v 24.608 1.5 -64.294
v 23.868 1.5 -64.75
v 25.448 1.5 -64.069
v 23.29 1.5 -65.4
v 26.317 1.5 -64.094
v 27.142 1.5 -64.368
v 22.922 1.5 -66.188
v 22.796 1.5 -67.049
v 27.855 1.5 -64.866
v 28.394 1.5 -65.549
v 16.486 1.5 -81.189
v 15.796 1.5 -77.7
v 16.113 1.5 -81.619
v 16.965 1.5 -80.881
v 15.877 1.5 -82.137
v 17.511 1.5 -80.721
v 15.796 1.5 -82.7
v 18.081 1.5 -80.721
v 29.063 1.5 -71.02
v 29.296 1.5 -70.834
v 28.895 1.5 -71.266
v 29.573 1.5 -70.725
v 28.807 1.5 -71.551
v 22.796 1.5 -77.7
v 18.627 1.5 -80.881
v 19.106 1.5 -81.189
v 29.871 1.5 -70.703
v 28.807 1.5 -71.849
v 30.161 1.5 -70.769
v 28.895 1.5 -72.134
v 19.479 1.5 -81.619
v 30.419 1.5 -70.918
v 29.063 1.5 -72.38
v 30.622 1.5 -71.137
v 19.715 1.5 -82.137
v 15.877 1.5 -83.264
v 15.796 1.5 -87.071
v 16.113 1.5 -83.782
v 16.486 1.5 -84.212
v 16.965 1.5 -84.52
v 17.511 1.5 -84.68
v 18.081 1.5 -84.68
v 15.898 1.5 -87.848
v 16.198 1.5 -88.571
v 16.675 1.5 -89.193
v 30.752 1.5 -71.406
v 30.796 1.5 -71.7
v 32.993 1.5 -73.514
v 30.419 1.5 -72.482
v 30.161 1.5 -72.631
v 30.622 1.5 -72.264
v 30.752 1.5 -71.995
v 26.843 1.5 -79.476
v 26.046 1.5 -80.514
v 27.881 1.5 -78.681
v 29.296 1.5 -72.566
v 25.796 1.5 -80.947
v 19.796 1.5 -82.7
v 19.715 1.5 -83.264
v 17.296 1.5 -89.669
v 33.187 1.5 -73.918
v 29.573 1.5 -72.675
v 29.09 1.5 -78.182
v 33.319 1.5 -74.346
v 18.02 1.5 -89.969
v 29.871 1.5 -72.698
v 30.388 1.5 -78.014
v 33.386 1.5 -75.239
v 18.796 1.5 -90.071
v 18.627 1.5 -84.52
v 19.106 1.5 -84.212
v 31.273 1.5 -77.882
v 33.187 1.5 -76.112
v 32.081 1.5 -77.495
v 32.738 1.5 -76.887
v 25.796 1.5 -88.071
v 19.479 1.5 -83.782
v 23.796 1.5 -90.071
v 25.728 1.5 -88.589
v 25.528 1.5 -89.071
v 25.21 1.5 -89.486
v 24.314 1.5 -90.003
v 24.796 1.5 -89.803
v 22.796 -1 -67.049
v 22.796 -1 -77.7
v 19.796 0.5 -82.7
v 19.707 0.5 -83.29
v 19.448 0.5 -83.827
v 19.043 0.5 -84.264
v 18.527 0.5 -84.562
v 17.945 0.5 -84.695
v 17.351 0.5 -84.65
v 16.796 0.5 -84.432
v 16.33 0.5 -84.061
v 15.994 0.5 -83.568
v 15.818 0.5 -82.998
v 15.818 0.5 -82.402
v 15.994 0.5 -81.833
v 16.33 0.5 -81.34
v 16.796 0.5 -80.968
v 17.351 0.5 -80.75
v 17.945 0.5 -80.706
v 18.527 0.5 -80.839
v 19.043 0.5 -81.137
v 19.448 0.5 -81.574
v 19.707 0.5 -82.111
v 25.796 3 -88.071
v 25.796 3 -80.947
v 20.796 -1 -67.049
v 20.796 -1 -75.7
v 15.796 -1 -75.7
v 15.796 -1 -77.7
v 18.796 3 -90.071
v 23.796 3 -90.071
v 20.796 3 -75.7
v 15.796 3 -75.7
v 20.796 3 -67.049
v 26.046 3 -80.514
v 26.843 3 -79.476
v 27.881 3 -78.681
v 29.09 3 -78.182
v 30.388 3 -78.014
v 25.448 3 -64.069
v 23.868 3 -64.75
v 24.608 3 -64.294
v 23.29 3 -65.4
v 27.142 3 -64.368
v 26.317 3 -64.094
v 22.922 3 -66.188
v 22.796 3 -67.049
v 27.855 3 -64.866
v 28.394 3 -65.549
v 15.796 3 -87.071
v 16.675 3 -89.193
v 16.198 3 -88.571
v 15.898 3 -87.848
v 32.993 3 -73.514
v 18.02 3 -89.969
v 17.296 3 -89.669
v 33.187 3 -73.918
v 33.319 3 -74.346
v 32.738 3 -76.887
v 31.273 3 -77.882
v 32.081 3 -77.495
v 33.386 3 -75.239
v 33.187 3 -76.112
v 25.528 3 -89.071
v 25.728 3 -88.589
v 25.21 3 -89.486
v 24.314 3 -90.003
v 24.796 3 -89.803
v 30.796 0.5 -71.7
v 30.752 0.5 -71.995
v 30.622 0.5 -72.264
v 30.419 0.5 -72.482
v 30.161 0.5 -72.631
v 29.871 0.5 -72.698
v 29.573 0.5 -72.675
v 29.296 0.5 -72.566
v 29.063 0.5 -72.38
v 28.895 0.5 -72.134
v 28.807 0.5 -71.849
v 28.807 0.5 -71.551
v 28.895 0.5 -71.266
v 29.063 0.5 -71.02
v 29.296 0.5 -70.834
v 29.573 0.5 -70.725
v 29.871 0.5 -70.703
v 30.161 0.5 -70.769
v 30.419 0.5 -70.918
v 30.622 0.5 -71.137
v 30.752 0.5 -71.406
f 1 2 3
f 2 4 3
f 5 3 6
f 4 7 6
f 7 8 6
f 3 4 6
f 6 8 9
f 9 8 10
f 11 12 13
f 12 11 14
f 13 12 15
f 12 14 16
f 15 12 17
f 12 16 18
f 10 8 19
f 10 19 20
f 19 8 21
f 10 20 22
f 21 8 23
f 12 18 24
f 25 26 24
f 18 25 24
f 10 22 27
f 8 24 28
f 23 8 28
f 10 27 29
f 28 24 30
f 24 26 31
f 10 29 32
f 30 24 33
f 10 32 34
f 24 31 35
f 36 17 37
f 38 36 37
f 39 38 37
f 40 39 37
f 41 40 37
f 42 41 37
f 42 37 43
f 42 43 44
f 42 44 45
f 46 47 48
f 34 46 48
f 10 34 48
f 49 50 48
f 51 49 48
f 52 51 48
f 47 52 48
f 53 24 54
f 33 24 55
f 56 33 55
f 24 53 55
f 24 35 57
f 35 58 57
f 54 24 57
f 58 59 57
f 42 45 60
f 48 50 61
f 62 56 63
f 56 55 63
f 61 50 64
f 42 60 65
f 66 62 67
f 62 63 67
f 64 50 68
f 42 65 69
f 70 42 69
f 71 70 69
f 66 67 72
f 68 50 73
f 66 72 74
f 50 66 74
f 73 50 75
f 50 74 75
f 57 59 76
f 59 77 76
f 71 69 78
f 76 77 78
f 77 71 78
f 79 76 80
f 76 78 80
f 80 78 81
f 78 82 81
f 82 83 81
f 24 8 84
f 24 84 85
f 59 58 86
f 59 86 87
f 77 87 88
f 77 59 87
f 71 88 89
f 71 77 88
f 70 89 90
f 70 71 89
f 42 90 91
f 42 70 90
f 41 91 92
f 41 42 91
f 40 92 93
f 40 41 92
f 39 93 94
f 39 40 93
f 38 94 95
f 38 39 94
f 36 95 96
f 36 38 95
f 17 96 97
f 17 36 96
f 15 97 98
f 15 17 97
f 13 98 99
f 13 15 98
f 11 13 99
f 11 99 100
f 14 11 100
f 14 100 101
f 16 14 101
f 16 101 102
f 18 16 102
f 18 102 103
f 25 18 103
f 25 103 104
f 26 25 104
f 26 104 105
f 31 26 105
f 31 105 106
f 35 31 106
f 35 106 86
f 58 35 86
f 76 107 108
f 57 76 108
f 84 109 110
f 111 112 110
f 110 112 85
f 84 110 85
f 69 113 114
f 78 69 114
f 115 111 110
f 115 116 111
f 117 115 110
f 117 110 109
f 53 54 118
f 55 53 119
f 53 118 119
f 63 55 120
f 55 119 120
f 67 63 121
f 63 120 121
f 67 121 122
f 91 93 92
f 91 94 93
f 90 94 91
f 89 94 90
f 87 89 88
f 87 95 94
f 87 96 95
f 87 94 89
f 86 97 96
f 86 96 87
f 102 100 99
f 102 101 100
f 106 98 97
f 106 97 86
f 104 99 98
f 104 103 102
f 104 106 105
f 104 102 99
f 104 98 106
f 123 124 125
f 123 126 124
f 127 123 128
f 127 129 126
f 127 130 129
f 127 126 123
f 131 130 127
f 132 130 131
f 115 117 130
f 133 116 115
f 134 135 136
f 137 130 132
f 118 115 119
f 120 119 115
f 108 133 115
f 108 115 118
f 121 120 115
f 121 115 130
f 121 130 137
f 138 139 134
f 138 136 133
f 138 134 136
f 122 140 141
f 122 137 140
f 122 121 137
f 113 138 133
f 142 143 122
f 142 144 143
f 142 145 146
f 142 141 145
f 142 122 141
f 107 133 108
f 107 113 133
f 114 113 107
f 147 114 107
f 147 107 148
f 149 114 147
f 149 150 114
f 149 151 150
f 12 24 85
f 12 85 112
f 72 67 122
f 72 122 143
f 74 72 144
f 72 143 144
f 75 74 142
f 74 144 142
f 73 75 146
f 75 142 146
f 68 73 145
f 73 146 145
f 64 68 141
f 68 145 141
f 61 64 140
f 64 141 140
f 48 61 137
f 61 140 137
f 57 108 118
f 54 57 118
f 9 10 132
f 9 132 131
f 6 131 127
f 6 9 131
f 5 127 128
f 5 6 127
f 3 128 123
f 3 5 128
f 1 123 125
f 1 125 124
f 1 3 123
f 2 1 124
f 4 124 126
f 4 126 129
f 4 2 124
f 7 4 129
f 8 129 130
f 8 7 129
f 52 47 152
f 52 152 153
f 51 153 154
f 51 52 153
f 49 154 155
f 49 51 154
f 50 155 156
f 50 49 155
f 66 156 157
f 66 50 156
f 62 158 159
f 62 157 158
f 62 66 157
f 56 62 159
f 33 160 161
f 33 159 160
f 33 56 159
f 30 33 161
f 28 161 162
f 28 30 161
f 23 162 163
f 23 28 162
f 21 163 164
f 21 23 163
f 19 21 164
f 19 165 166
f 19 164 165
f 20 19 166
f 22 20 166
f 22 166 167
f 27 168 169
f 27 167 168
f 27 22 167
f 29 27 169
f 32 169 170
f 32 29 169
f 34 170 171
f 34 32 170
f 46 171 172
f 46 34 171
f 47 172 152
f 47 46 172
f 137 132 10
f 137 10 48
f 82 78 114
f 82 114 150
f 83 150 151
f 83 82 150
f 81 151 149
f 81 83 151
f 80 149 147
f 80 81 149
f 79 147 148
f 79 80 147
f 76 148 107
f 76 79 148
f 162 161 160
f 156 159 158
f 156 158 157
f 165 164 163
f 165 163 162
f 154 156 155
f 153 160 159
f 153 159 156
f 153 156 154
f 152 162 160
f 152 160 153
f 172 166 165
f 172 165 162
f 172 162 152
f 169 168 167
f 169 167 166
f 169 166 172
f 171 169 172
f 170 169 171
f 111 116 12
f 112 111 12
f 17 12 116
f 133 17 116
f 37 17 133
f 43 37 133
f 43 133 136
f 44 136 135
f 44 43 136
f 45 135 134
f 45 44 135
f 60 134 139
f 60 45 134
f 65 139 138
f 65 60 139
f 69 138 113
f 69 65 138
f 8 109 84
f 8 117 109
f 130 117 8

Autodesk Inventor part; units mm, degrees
ref_plane "YZ Plane" through (0, 0, 0) normal (1, 0, 0) x (0, 1, 0)
ref_plane "XZ Plane" through (0, 0, 0) normal (0, 1, 0) x (-1, 0, 0)
ref_plane "XY Plane" through (0, 0, 0) normal (0, 0, 1) x (1, 0, 0)
sketch "スケッチ1" plane through (0, 0, 0) normal (0, 1, 0) x (-1, 0, 0)
  line L0 (75, 0) -> (105, -51.9615)
  line L1 (-75, 0) -> (-105, -51.9615)
  line L2 (0, -218.2384) -> (0, 36.3731)
  line L3 (147, 0) -> (-147, 0)
  line L4 (37.5, -27) -> (-37.5, -27)
  line L5 (105, -51.9615) -> (30, -181.8653)
  line L6 (30, -181.8653) -> (-30, -181.8653)
  line L7 (-30, -181.8653) -> (-105, -51.9615)
  line L8 (75, 0) -> (-75, 0)
  line L9 (-25.3673, -135.8894) -> (-62.8673, -70.9375)
  line L10 (25.3673, -135.8894) -> (62.8673, -70.9375)
  line L11 (-37.5, -27) -> (-27.5, -27)
  line L12 (-27.5, -27) -> (-27.5, -39)
  line L13 (-27.5, -39) -> (-37.5, -39)
  line L14 (-37.5, -39) -> (-37.5, -27)
  line L15 (37.5, -27) -> (27.5, -27)
  line L16 (27.5, -27) -> (27.5, -39)
  line L17 (27.5, -39) -> (37.5, -39)
  line L18 (37.5, -39) -> (37.5, -27)
  line L19 (0, -77.9423) -> (44.1173, -103.4134) construction
  line L20 (0, -77.9423) -> (-44.1173, -103.4134) construction
  line L21 (-44.1173, -103.4134) -> (-67.5, -116.9134) construction
  line L22 (-57.8673, -79.5977) -> (-47.475, -73.5977)
  line L23 (-52.475, -64.9375) -> (-62.8673, -70.9375)
  line L24 (-62.8673, -70.9375) -> (-57.8673, -79.5977)
  line L25 (-47.475, -73.5977) -> (-52.475, -64.9375)
  line L26 (-25.3673, -135.8894) -> (-30.3673, -127.2291)
  line L27 (-19.975, -121.2291) -> (-14.975, -129.8894)
  line L28 (-14.975, -129.8894) -> (-25.3673, -135.8894)
  line L29 (-30.3673, -127.2291) -> (-19.975, -121.2291)
  line L30 (30.3673, -127.2291) -> (19.975, -121.2291)
  line L31 (14.975, -129.8894) -> (25.3673, -135.8894)
  line L32 (25.3673, -135.8894) -> (30.3673, -127.2291)
  line L33 (19.975, -121.2291) -> (14.975, -129.8894)
  line L34 (62.8673, -70.9375) -> (57.8673, -79.5977)
  line L35 (47.475, -73.5977) -> (52.475, -64.9375)
  line L36 (52.475, -64.9375) -> (62.8673, -70.9375)
  line L37 (57.8673, -79.5977) -> (47.475, -73.5977)
  line L38 (62.8673, -70.9375) -> (37.5, -27)
  line L39 (-37.5, -27) -> (-62.8673, -70.9375)
  line L40 (-25.3673, -135.8894) -> (25.3673, -135.8894)
  line L41 (-25.3673, -135.8894) -> (-25.3673, -181.8653)
  line L42 (25.3673, -135.8894) -> (25.3673, -181.8653)
  line L43 (-25.3673, -135.8894) -> (-48.75, -149.3894)
  line L44 (25.3673, -135.8894) -> (48.75, -149.3894)
  point P0 (0, 0)
  point P1 (0, 0)
  point P2 (0, -27)
  dimension "d1" = 150
  dimension "d2" = 60
  dimension "d3" = 60
  dimension "d4" = 27
  dimension "d5" = 75
  dimension "d6" = 60
  dimension "d7" = 27
  dimension "d8" = 10
  dimension "d9" = 12
  dimension "d10" = 10
  dimension "d11" = 12
  dimension "d14" = 360
extrude "プレート1" add sketch "スケッチ1" along normal blind 1.5 contours L5 L6 L42 L44 | L4 L16 L17 L18 L38 L36 L35 L37 L10 L30 L33 L31 L40 L2 | L2 L40 L28 L27 L29 L9 L22 L25 L23 L39 L14 L13 L12 L4 | L31 L33 L30 L10 | L42 L6 L2 L40 | L2 L6 L41 L40 | L4 L18 L17 L16 | L12 L13 L14 L4 | L9 L29 L27 L28 | L41 L6 L7 L43 | L37 L35 L36 L10 | L23 L25 L22 L9
sketch "スケッチ2" plane through (0, 0, 0) normal (0, -1, 0) x (1, 0, 0)
  line L0 (23.3798, -38.55) -> (-23.3798, -38.55) projected
  line L1 (8.2, -46.6) -> (-8.2, -46.6) projected
  arc A0 (-21.1, -27) -> (-23.3798, -38.55) centre (-21.1, -33) ccw projected
  line L2 (-27.5, -27) -> (-27.5, -39) projected
  line L3 (27.5, -39) -> (27.5, -27) projected
  line L4 (-27.5, -39) -> (-27.5, -40.55)
  line L5 (-27.5, -40.55) -> (-10.2, -40.55)
  line L6 (-10.2, -40.55) -> (-10.2, -48.6)
  line L7 (-10.2, -48.6) -> (10.2, -48.6)
  line L8 (10.2, -48.6) -> (10.2, -40.55)
  line L9 (10.2, -40.55) -> (27.5, -40.55)
  line L10 (27.5, -40.55) -> (27.5, -39)
  line L11 (-37.5, -27) -> (-27.5, -27) projected
  line L12 (-37.5, -27) -> (37.5, -27) projected
  line L13 (-20.3112, -101.4469) -> (-30.5112, -83.78)
  line L14 (-27.2827, -105.4719) -> (-20.3112, -101.4469)
  line L15 (-18.6327, -120.4541) -> (-27.2827, -105.4719)
  line L16 (-19.975, -121.2291) -> (-18.6327, -120.4541)
  line L17 (-37.4827, -87.805) -> (-46.1327, -72.8227)
  line L18 (-46.1327, -72.8227) -> (-47.475, -73.5977)
  line L19 (-30.5112, -83.78) -> (-37.4827, -87.805)
  line L20 (30.5112, -83.78) -> (20.3112, -101.4469)
  line L21 (37.4827, -87.805) -> (30.5112, -83.78)
  line L22 (46.1327, -72.8227) -> (37.4827, -87.805)
  line L23 (47.475, -73.5977) -> (46.1327, -72.8227)
  line L24 (27.2827, -105.4719) -> (18.6327, -120.4541)
  line L25 (18.6327, -120.4541) -> (19.975, -121.2291)
  line L26 (20.3112, -101.4469) -> (27.2827, -105.4719)
  line L27 (-47.475, -73.5977) -> (-57.8673, -79.5977)
  line L28 (-57.8673, -79.5977) -> (-30.3673, -127.2291)
  line L29 (-30.3673, -127.2291) -> (-19.975, -121.2291)
  line L30 (19.975, -121.2291) -> (30.3673, -127.2291)
  line L31 (30.3673, -127.2291) -> (57.8673, -79.5977)
  line L32 (57.8673, -79.5977) -> (47.475, -73.5977)
  point P0 (0, 0)
  point P1 (0, -77.9423)
  point P2 (-23.0432, -100.7148)
  point P3 (-33.5673, -121.6866)
  point P4 (-22.4248, -117.8859)
  point P5 (-25.3673, -135.8894)
  point P6 (-28.3712, -118.6866)
  point P7 (-31.2432, -86.512)
  point P8 (-45.8046, -77.3909)
  point P9 (-62.8673, -70.9375)
  point P10 (31.2432, -86.512)
  point P11 (54.6673, -85.1403)
  point P12 (45.8046, -77.3909)
  point P13 (62.8673, -70.9375)
  point P14 (49.4712, -82.1403)
  point P15 (23.0432, -100.7148)
  point P16 (22.4248, -117.8859)
  point P17 (25.3673, -135.8894)
  dimension "d17" = 2
  dimension "d18" = 2
  dimension "d19" = 2
  dimension "d20" = 2
  dimension "d26" = 360
extrude "切り取り1" cut sketch "スケッチ2" against normal blind 1.5
fillet "フィレット1" radius 1.5 18 edges at (-10.2, 0.75, -48.6) (-10.2, 0.75, -40.55) (-27.5, 0.75, -40.55) (10.2, 0.75, -48.6) (10.2, 0.75, -40.55) (27.5, 0.75, -40.55) (-30.5112, 0.75, -83.78) (-46.1327, 0.75, -72.8227) (-20.3112, 0.75, -101.4469) (-27.2827, 0.75, -105.4719) (-37.4827, 0.75, -87.805) (-18.6327, 0.75, -120.4541) (20.3112, 0.75, -101.4469) (27.2827, 0.75, -105.4719) (18.6327, 0.75, -120.4541) (30.5112, 0.75, -83.78) (37.4827, 0.75, -87.805) (46.1327, 0.75, -72.8227)
sketch "スケッチ3" plane through (0, 0, 0) normal (0, -1, 0) x (1, 0, 0)
  circle A0 centre (40.9875, -45.0405) radius 1.6 projected
  circle A1 centre (48.9875, -58.8969) radius 1.6 projected
  circle A2 centre (8, -129.8894) radius 1.6 projected
  circle A3 centre (-8, -129.8894) radius 1.6 projected
  circle A4 centre (-48.9875, -58.8969) radius 1.6 projected
  circle A5 centre (-40.9875, -45.0405) radius 1.6 projected
  point P0 (0, 0)
extrude "切り取り2" cut sketch "スケッチ3" against normal blind 1.5
sketch "スケッチ4" plane through (0, 0, 0) normal (0, -1, 0) x (1, 0, 0)
  circle A0 centre (10, -176.8653) radius 1.35 projected
  circle A1 centre (21.2333, -145.0496) radius 1.6 projected
  circle A2 centre (10, -143.8894) radius 1.6 projected
  line L0 (52.75, -142.4612) -> (30, -181.8653) projected
  line L1 (52.75, -142.4612) -> (33.6974, -131.4612) projected
  line L2 (33.6974, -131.4612) -> (27.1974, -142.7195) projected
  line L3 (27.1974, -142.7195) -> (20.5635, -138.8894) projected
  line L4 (20.5635, -138.8894) -> (5, -138.8894) projected
  line L5 (5, -138.8894) -> (5, -181.8653) projected
  line L6 (30, -181.8653) -> (5, -181.8653) projected
  circle A3 centre (-10, -176.8653) radius 1.35 projected
  circle A4 centre (-21.2333, -145.0496) radius 1.6 projected
  circle A5 centre (-10, -143.8894) radius 1.6 projected
  line L7 (-12.9295, -171.4323) -> (-35.4295, -132.4612) projected
  line L8 (-30.25, -181.4323) -> (-12.9295, -171.4323) projected
  line L9 (-30, -181.8653) -> (-30.25, -181.4323) projected
  line L10 (-30, -181.8653) -> (-5, -181.8653) projected
  line L11 (-5, -181.8653) -> (-5, -138.8894) projected
  line L12 (-5, -138.8894) -> (-20.5635, -138.8894) projected
  line L13 (-20.5635, -138.8894) -> (-27.1974, -142.7195) projected
  line L14 (-33.6974, -131.4612) -> (-27.1974, -142.7195) projected
  line L15 (-35.4295, -132.4612) -> (-33.6974, -131.4612) projected
  point P0 (0, 0)
extrude "切り取り3" cut sketch "スケッチ4" against normal blind 1.5 contours A0 | A1 | A2 | A3 | A4 | A5
sketch "スケッチ5" plane through (0, 1.5, 0) normal (0, 1, 0) x (1, 0, 0)
  line L0 (-19.975, 121.2291) -> (19.975, 121.2291) projected
  line L1 (47.475, 73.5977) -> (27.5, 39) projected
  line L2 (-47.475, 73.5977) -> (-27.5, 39) projected
  point P0 (0, 0)
sketch "スケッチ6" plane through (0, 1.5, 0) normal (0, 1, 0) x (1, 0, 0)
  line L0 (-26.0855, 44.55) -> (-41.9613, 72.0477)
  line L1 (-41.9613, 72.0477) -> (-36.0186, 82.3409)
  line L2 (-36.0186, 82.3409) -> (-29.0471, 78.3159)
  line L3 (-29.0471, 78.3159) -> (-14.8471, 102.911)
  line L4 (-14.8471, 102.911) -> (-21.8186, 106.936)
  line L5 (-21.8186, 106.936) -> (-15.8758, 117.2291)
  line L6 (-15.8758, 117.2291) -> (15.8758, 117.2291)
  line L7 (15.8758, 117.2291) -> (21.8186, 106.936)
  line L8 (21.8186, 106.936) -> (14.8471, 102.911)
  line L9 (14.8471, 102.911) -> (29.0471, 78.3159)
  line L10 (29.0471, 78.3159) -> (36.0186, 82.3409)
  line L11 (36.0186, 82.3409) -> (41.9613, 72.0477)
  line L12 (41.9613, 72.0477) -> (26.0855, 44.55)
  line L13 (26.0855, 44.55) -> (14.2, 44.55)
  line L14 (14.2, 44.55) -> (14.2, 52.6)
  line L15 (14.2, 52.6) -> (-14.2, 52.6)
  line L16 (-14.2, 52.6) -> (-14.2, 44.55)
  line L17 (-14.2, 44.55) -> (-26.0855, 44.55)
  line L18 (-47.475, 73.5977) -> (-27.5, 39) projected
  line L19 (-38.2327, 86.5059) -> (-45.3827, 74.1218) projected
  line L20 (-31.8102, 84.53) -> (-36.1836, 87.055) projected
  line L21 (-21.0612, 100.1479) -> (-29.7612, 85.079) projected
  line L22 (-25.9836, 104.7219) -> (-21.6102, 102.1969) projected
  line L23 (-19.3827, 119.1551) -> (-26.5327, 106.7709) projected
  line L24 (-19.975, 121.2291) -> (19.975, 121.2291) projected
  line L25 (47.475, 73.5977) -> (27.5, 39) projected
  line L26 (26.5327, 106.7709) -> (19.3827, 119.1551) projected
  line L27 (21.6102, 102.1969) -> (25.9836, 104.7219) projected
  line L28 (29.7612, 85.079) -> (21.0612, 100.1479) projected
  line L29 (36.1836, 87.055) -> (31.8102, 84.53) projected
  line L30 (45.3827, 74.1218) -> (38.2327, 86.5059) projected
  line L31 (11.7, 40.55) -> (26, 40.55) projected
  line L32 (10.2, 47.1) -> (10.2, 42.05) projected
  line L33 (-8.7, 48.6) -> (8.7, 48.6) projected
  line L34 (-10.2, 42.05) -> (-10.2, 47.1) projected
  line L35 (-26, 40.55) -> (-11.7, 40.55) projected
  line L36 (0, 48.6) -> (0, 121.2291)
  line L37 (-25.4112, 92.6134) -> (-31.0836, 95.8884) construction
  point P0 (0, 0)
  dimension "d32" = 4
  dimension "d33" = 4
  dimension "d34" = 4
  dimension "d35" = 4
  dimension "d36" = 4
  dimension "d37" = 4
  dimension "d38" = 4
  dimension "d39" = 4
  dimension "d40" = 4
extrude "切り取り4" cut sketch "スケッチ6" against normal blind 1.5
fillet "フィレット2" radius 5 9 edges at (-14.2, 0.75, -44.55) (-26.0855, 0.75, -44.55) (-41.9613, 0.75, -72.0477) (-36.0186, 0.75, -82.3409) (-21.8186, 0.75, -106.936) (-15.8758, 0.75, -117.2291) (-14.2, 0.75, -52.6) (-29.0471, 0.75, -78.3159) (-14.8471, 0.75, -102.911)
mirror "ミラー1" about plane through (0, 0, 0) normal (1, 0, 0) of "フィレット2"
sketch "スケッチ7" plane through (0, 1.5, 0) normal (0, 1, 0) x (1, 0, 0)
  arc A0 (18.2848, 105.0066) -> (17.2511, 98.7471) centre (21.5812, 101.2471) ccw projected
  line L0 (17.2511, 98.7471) -> (26.643, 82.4797) projected
  arc A1 (26.643, 82.4797) -> (32.5808, 80.2452) centre (30.9732, 84.9797) ccw projected
  arc A2 (38.5186, 78.0107) -> (32.5808, 80.2452) centre (34.1884, 75.5107) ccw projected
  line L1 (38.5186, 78.0107) -> (40.5179, 74.5477) projected
  arc A3 (40.5179, 69.5477) -> (40.5179, 74.5477) centre (36.1878, 72.0477) ccw projected
  line L2 (40.5179, 69.5477) -> (27.5289, 47.05) projected
  arc A4 (23.1987, 44.55) -> (27.5289, 47.05) centre (23.1987, 49.55) ccw projected
  line L3 (23.1987, 44.55) -> (19.2, 44.55) projected
  arc A5 (14.296, 48.575) -> (19.2, 44.55) centre (19.2, 49.55) ccw projected
  arc A6 (14.296, 48.575) -> (9.392, 52.6) centre (9.392, 47.6) ccw projected
  line L4 (9.392, 52.6) -> (-9.392, 52.6) projected
  arc A7 (-9.392, 52.6) -> (-14.296, 48.575) centre (-9.392, 47.6) ccw projected
  arc A8 (-19.2, 44.55) -> (-14.296, 48.575) centre (-19.2, 49.55) ccw projected
  line L5 (-19.2, 44.55) -> (-23.1987, 44.55) projected
  arc A9 (-27.5289, 47.05) -> (-23.1987, 44.55) centre (-23.1987, 49.55) ccw projected
  line L6 (-27.5289, 47.05) -> (-40.5179, 69.5477) projected
  arc A10 (-40.5179, 74.5477) -> (-40.5179, 69.5477) centre (-36.1878, 72.0477) ccw projected
  line L7 (-40.5179, 74.5477) -> (-38.5186, 78.0107) projected
  arc A11 (-32.5808, 80.2452) -> (-38.5186, 78.0107) centre (-34.1884, 75.5107) ccw projected
  arc A12 (-32.5808, 80.2452) -> (-26.643, 82.4797) centre (-30.9732, 84.9797) ccw projected
  line L8 (-26.643, 82.4797) -> (-17.2511, 98.7471) projected
  arc A13 (-17.2511, 98.7471) -> (-18.2848, 105.0066) centre (-21.5812, 101.2471) ccw projected
  arc A14 (-19.3186, 111.2661) -> (-18.2848, 105.0066) centre (-14.9884, 108.7661) ccw projected
  line L9 (-19.3186, 111.2661) -> (-17.3192, 114.7291) projected
  arc A15 (-12.9891, 117.2291) -> (-17.3192, 114.7291) centre (-12.9891, 112.2291) ccw projected
  line L10 (-12.9891, 117.2291) -> (12.9891, 117.2291) projected
  arc A16 (17.3192, 114.7291) -> (12.9891, 117.2291) centre (12.9891, 112.2291) ccw projected
  line L11 (17.3192, 114.7291) -> (19.3186, 111.2661) projected
  arc A17 (18.2848, 105.0066) -> (19.3186, 111.2661) centre (14.9884, 108.7661) ccw projected
  circle A18 centre (21.2333, 145.0496) radius 1.6 projected
  circle A19 centre (-10, 143.8894) radius 1.6 projected
  circle A20 centre (-10, 176.8653) radius 1.35 projected
  circle A21 centre (-21.2333, 145.0496) radius 1.6 projected
  circle A22 centre (10, 176.8653) radius 1.35 projected
  circle A23 centre (10, 143.8894) radius 1.6 projected
  circle A24 centre (-48.9875, 58.8969) radius 1.6 projected
  circle A25 centre (8, 129.8894) radius 1.6 projected
  circle A26 centre (40.9875, 45.0405) radius 1.6 projected
  circle A27 centre (48.9875, 58.8969) radius 1.6 projected
  circle A28 centre (-8, 129.8894) radius 1.6 projected
  circle A29 centre (-40.9875, 45.0405) radius 1.6 projected
  arc A30 (38.2327, 86.5059) -> (36.1836, 87.055) centre (36.9336, 85.7559) ccw projected
  line L12 (36.1836, 87.055) -> (31.8102, 84.53) projected
  arc A31 (29.7612, 85.079) -> (31.8102, 84.53) centre (31.0602, 85.829) ccw projected
  line L13 (29.7612, 85.079) -> (21.0612, 100.1479) projected
  arc A32 (21.6102, 102.1969) -> (21.0612, 100.1479) centre (22.3602, 100.8979) ccw projected
  line L14 (21.6102, 102.1969) -> (25.9836, 104.7219) projected
  arc A33 (25.9836, 104.7219) -> (26.5327, 106.7709) centre (25.2336, 106.0209) ccw projected
  line L15 (26.5327, 106.7709) -> (19.3827, 119.1551) projected
  arc A34 (19.9317, 121.2041) -> (19.3827, 119.1551) centre (20.6817, 119.9051) ccw projected
  line L16 (19.9317, 121.2041) -> (30.3673, 127.2291) projected
  line L17 (25.3673, 135.8894) -> (30.3673, 127.2291) projected
  line L18 (48.75, 149.3894) -> (25.3673, 135.8894) projected
  line L19 (30, 181.8653) -> (48.75, 149.3894) projected
  line L20 (-30, 181.8653) -> (30, 181.8653) projected
  line L21 (-48.75, 149.3894) -> (-30, 181.8653) projected
  line L22 (-25.3673, 135.8894) -> (-48.75, 149.3894) projected
  line L23 (-30.3673, 127.2291) -> (-25.3673, 135.8894) projected
  line L24 (-30.3673, 127.2291) -> (-19.9317, 121.2041) projected
  arc A35 (-19.3827, 119.1551) -> (-19.9317, 121.2041) centre (-20.6817, 119.9051) ccw projected
  line L25 (-19.3827, 119.1551) -> (-26.5327, 106.7709) projected
  arc A36 (-26.5327, 106.7709) -> (-25.9836, 104.7219) centre (-25.2336, 106.0209) ccw projected
  line L26 (-25.9836, 104.7219) -> (-21.6102, 102.1969) projected
  arc A37 (-21.0612, 100.1479) -> (-21.6102, 102.1969) centre (-22.3602, 100.8979) ccw projected
  line L27 (-21.0612, 100.1479) -> (-29.7612, 85.079) projected
  arc A38 (-31.8102, 84.53) -> (-29.7612, 85.079) centre (-31.0602, 85.829) ccw projected
  line L28 (-31.8102, 84.53) -> (-36.1836, 87.055) projected
  arc A39 (-36.1836, 87.055) -> (-38.2327, 86.5059) centre (-36.9336, 85.7559) ccw projected
  line L29 (-38.2327, 86.5059) -> (-45.3827, 74.1218) projected
  arc A40 (-47.4317, 73.5727) -> (-45.3827, 74.1218) centre (-46.6817, 74.8718) ccw projected
  line L30 (-47.4317, 73.5727) -> (-57.8673, 79.5977) projected
  line L31 (-62.8673, 70.9375) -> (-57.8673, 79.5977) projected
  line L32 (-37.5, 27) -> (-62.8673, 70.9375) projected
  line L33 (-27.5, 27) -> (-37.5, 27) projected
  line L34 (-27.5, 27) -> (-27.5, 39.05) projected
  arc A41 (-26, 40.55) -> (-27.5, 39.05) centre (-26, 39.05) ccw projected
  line L35 (-26, 40.55) -> (-11.7, 40.55) projected
  arc A42 (-11.7, 40.55) -> (-10.2, 42.05) centre (-11.7, 42.05) ccw projected
  line L36 (-10.2, 42.05) -> (-10.2, 47.1) projected
  arc A43 (-8.7, 48.6) -> (-10.2, 47.1) centre (-8.7, 47.1) ccw projected
  line L37 (-8.7, 48.6) -> (8.7, 48.6) projected
  arc A44 (10.2, 47.1) -> (8.7, 48.6) centre (8.7, 47.1) ccw projected
  line L38 (10.2, 47.1) -> (10.2, 42.05) projected
  arc A45 (10.2, 42.05) -> (11.7, 40.55) centre (11.7, 42.05) ccw projected
  line L39 (11.7, 40.55) -> (26, 40.55) projected
  arc A46 (27.5, 39.05) -> (26, 40.55) centre (26, 39.05) ccw projected
  line L40 (27.5, 39.05) -> (27.5, 27) projected
  line L41 (37.5, 27) -> (27.5, 27) projected
  line L42 (62.8673, 70.9375) -> (37.5, 27) projected
  line L43 (57.8673, 79.5977) -> (62.8673, 70.9375) projected
  line L44 (57.8673, 79.5977) -> (47.4317, 73.5727) projected
  arc A47 (45.3827, 74.1218) -> (47.4317, 73.5727) centre (46.6817, 74.8718) ccw projected
  line L45 (45.3827, 74.1218) -> (38.2327, 86.5059) projected
  line L46 (25.2195, 46.05) -> (15.796, 46.05)
  line L47 (15.796, 46.05) -> (15.796, 54.1)
  line L48 (15.796, 54.1) -> (-15.796, 54.1)
  line L49 (-15.796, 54.1) -> (-15.796, 46.05)
  line L50 (-15.796, 46.05) -> (-25.2195, 46.05)
  line L51 (-25.2195, 46.05) -> (-40.2293, 72.0477)
  line L52 (-40.2293, 72.0477) -> (-35.5175, 80.2087)
  line L53 (-35.5175, 80.2087) -> (-28.546, 76.1837)
  line L54 (-28.546, 76.1837) -> (-12.75, 103.5432)
  line L55 (-12.75, 103.5432) -> (-19.7215, 107.5682)
  line L56 (-19.7215, 107.5682) -> (-15.0098, 115.7291)
  line L57 (-15.0098, 115.7291) -> (15.0098, 115.7291)
  line L58 (15.0098, 115.7291) -> (19.7215, 107.5682)
  line L59 (19.7215, 107.5682) -> (12.75, 103.5432)
  line L60 (12.75, 103.5432) -> (28.546, 76.1837)
  line L61 (28.546, 76.1837) -> (35.5175, 80.2087)
  line L62 (35.5175, 80.2087) -> (40.2293, 72.0477)
  line L63 (40.2293, 72.0477) -> (25.2195, 46.05)
  line L64 (0, 54.1) -> (0, 115.7291) construction
  line L65 (0, 218.2384) -> (0, -36.3731) construction
  line L66 (40.5179, 69.5477) -> (27.5289, 47.05) projected
  line L67 (20.648, 89.8634) -> (0, 77.9423) construction
  line L68 (0, 54.1) -> (0, 77.9423) construction
  line L69 (17.3192, 114.7291) -> (19.3186, 111.2661) projected
  point P0 (0, 0)
  dimension "d44" = 1.5
  dimension "d45" = 1.5
  dimension "d46" = 1.5
  dimension "d47" = 1.5
  dimension "d48" = 1.5
  dimension "d49" = 1.5
  dimension "d50" = 1.5
  dimension "d51" = 1.5
extrude "押し出し1" cut sketch "スケッチ7" against normal through all contours A0 L0 A1 A2 L1 A3 L2 A4 L3 A5 A6 L4 A7 A8 L5 A9 L6 A10 L7 A11 A12 L8 A13 A14 L9 A15 L10 A16 L11 A17 | L45 A47 L44 L43 L42 L41 L40 A46 L39 A45 L38 A44 L37 A43 L36 A42 L35 A41 L34 L33 L32 L31 L30 A40 L29 A39 L28 A38 L27 A37 L26 A36 L25 A35 L24 L23 L22 L21 L20 L19 L18 L17 L16 A34 L15 A33 L14 A32 L13 A31 L12 A30 | L46 L47 L48 L49 L50 L51 L52 L53 L54 L55 L56 L57 L58 L59 L60 L61 L62 L63
extrude "押し出し2" add sketch "スケッチ7" along normal blind 1.5 contours L46 L47 L48 L49 L50 L51 L52 L53 L54 L55 L56 L57 L58 L59 L60 L61 L62 L63
sketch "スケッチ8" plane through (0, 3, 0) normal (0, 1, 0) x (1, 0, 0)
  line L0 (15, 59.1) -> (-15, 59.1)
  line L1 (-15, 59.1) -> (-15, 124.1)
  line L2 (-15, 124.1) -> (15, 124.1)
  line L3 (15, 124.1) -> (15, 59.1)
  line L4 (-15.796, 54.1) -> (15.796, 54.1) projected
  line L5 (15.0098, 115.7291) -> (-15.0098, 115.7291) projected
  line L6 (15, 59.1) -> (15, 54.1)
  line L7 (-15.796, 46.05) -> (-15.796, 54.1) projected
  line L8 (-25.2195, 46.05) -> (-15.796, 46.05) projected
  line L9 (-40.2293, 72.0477) -> (-25.2195, 46.05) projected
  line L10 (-35.5175, 80.2087) -> (-40.2293, 72.0477) projected
  line L11 (-28.546, 76.1837) -> (-35.5175, 80.2087) projected
  line L12 (-12.75, 103.5432) -> (-28.546, 76.1837) projected
  line L13 (-19.7215, 107.5682) -> (-12.75, 103.5432) projected
  line L14 (-15.0098, 115.7291) -> (-19.7215, 107.5682) projected
  line L15 (15.796, 54.1) -> (15.796, 114.3674)
  line L16 (19.7215, 107.5682) -> (15.0098, 115.7291) projected
  line L17 (12.75, 103.5432) -> (19.7215, 107.5682) projected
  point P0 (0, 0)
  point P1 (0, 59.1)
  point P2 (0, 54.1)
  point P3 (-15, 115.7291)
  point P4 (15, 115.7291)
  point P5 (-15, 104.8422)
  point P6 (-15, 99.6461)
  point P7 (15.796, 105.3017)
  dimension "d56" = 65
  dimension "d57" = 30
  dimension "d58" = 5
extrude "押し出し3" cut sketch "スケッチ8" against normal through all
fillet "フィレット4" radius 5 5 edges at (28.546, 2.25, -76.1837) (35.5175, 2.25, -80.2087) (40.2293, 2.25, -72.0477) (25.2195, 2.25, -46.05) (15.796, 2.25, -46.05)
fillet "フィレット5" radius 3 1 edges at (15.796, 2.25, -98.2674)
sketch "スケッチ9" plane through (0, 1.5, 0) normal (0, -1, 0) x (1, 0, 0)
  line L0 (11.5, -82.5) -> (11.5, -82.525) projected
  line L1 (11.5, -82.5) -> (14.13, -82.5) projected
  arc A0 (14.13, -82.5) -> (14.18, -82.45) centre (14.13, -82.45) ccw projected
  line L2 (14.18, -82.95) -> (14.18, -82.45) projected
  arc A1 (14.18, -82.95) -> (14.13, -82.9) centre (14.13, -82.95) ccw projected
  line L3 (11.5, -82.9) -> (14.13, -82.9) projected
  line L4 (11.5, -82.875) -> (11.5, -82.9) projected
  line L5 (11.11, -82.875) -> (11.5, -82.875) projected
  arc A2 (11.0667, -82.85) -> (11.11, -82.875) centre (11.11, -82.825) ccw projected
  arc A3 (11.0667, -82.85) -> (11.0234, -82.825) centre (11.0234, -82.875) ccw projected
  line L6 (10.96, -82.825) -> (11.0234, -82.825) projected
  line L7 (10.96, -82.575) -> (10.96, -82.825) projected
  line L8 (11.0234, -82.575) -> (10.96, -82.575) projected
  arc A4 (11.0234, -82.575) -> (11.0667, -82.55) centre (11.0234, -82.525) ccw projected
  arc A5 (11.11, -82.525) -> (11.0667, -82.55) centre (11.11, -82.575) ccw projected
  line L9 (11.5, -82.525) -> (11.11, -82.525) projected
  line L10 (13.14, -82.875) -> (13.14, -82.525) projected
  line L11 (13.14, -82.875) -> (13.2786, -82.875) projected
  line L12 (13.2786, -82.875) -> (13.2786, -82.525) projected
  line L13 (13.2786, -82.525) -> (13.14, -82.525) projected
  arc A6 (15.796, -87.0713) -> (21.3941, -88.5713) centre (18.796, -87.0713) ccw projected
  point P0 (0, 0)
  point P1 (14.18, -82.7)
  dimension "d64" = 4.3713
sketch "スケッチ10" plane through (0, 3, 0) normal (0, 1, 0) x (1, 0, 0)
  arc A0 (21.3941, 88.5713) -> (15.796, 87.0713) centre (18.796, 87.0713) ccw projected
  line L0 (18.796, 90.0713) -> (25.796, 90.0713)
  line L1 (25.796, 90.0713) -> (25.796, 80.9469)
  line L2 (26.046, 80.5138) -> (21.3941, 88.5713) projected
  line L3 (15.796, 87.0713) -> (15.796, 51.05) projected
  point P0 (0, 0)
  dimension "d65" = 10
extrude "押し出し4" add sketch "スケッチ10" against normal up to surface (1.5 mm away)
fillet "フィレット6" radius 2 1 edges at (25.796, 2.25, -90.0713)
sketch "スケッチ12" plane through (0, 1.5, 0) normal (0, -1, 0) x (1, 0, 0)
  circle A0 centre (17.796, -52.05) radius 2
  circle A1 centre (26.3742, -52.05) radius 2
  circle A2 centre (17.796, -82.7003) radius 2
  line L0 (20.796, -46.05) -> (22.3327, -46.05) projected
  line L1 (15.796, -51.05) -> (15.796, -87.0713) projected
  line L2 (26.6628, -48.55) -> (38.7859, -69.5477) projected
  arc A3 (15.796, -87.0713) -> (21.3941, -88.5713) centre (18.796, -87.0713) ccw projected
  arc A4 (15.796, -87.0713) -> (18.796, -90.0713) centre (18.796, -87.0713) ccw projected
  point P0 (0, 0)
  dimension "d69" = 4
  dimension "d70" = 6
  dimension "d71" = 4.371
extrude "押し出し5" add sketch "スケッチ12" along normal blind 1
sketch "スケッチ13" plane through (0, 1.5, 0) normal (0, -1, 0) x (1, 0, 0)
  line L0 (15.796, -87.7003) -> (25.796, -87.7003)
  line L1 (25.796, -87.7003) -> (25.796, -77.7003)
  line L2 (25.796, -77.7003) -> (15.796, -77.7003)
  line L3 (15.796, -77.7003) -> (15.796, -87.7003)
  circle A0 centre (17.796, -82.7003) radius 2 projected
  line L4 (15.796, -50.05) -> (22.796, -50.05)
  line L5 (22.796, -50.05) -> (22.796, -77.7003)
  line L6 (22.796, -77.7003) -> (15.796, -77.7003)
  line L7 (15.796, -77.7003) -> (15.796, -50.05)
  line L8 (15.796, -52.05) -> (15.796, -82.7003) projected
  circle A1 centre (17.796, -52.05) radius 2 projected
  line L9 (25.796, -88.0713) -> (25.796, -80.9469) projected
  line L10 (22.6062, -41.5237) -> (16.544, -45.0237)
  line L11 (16.544, -45.0237) -> (38.2131, -82.5556)
  line L12 (38.2131, -82.5556) -> (44.2753, -79.0556)
  line L13 (44.2753, -79.0556) -> (22.6062, -41.5237)
  line L14 (28.1062, -51.05) -> (38.7859, -69.5477) projected
  arc A2 (20.796, -46.05) -> (15.796, -51.05) centre (20.796, -51.05) ccw projected
  circle A3 centre (29.796, -71.7003) radius 1
  point P0 (0, 0)
  point P1 (22.796, -55.8524)
  point P2 (17.739, -47.0934)
  point P3 (15.897, -50.05)
  dimension "d74" = 5
  dimension "d75" = 10
  dimension "d76" = 7
  dimension "d77" = 7
  dimension "d84" = 7
  dimension "d85" = 6
  dimension "d86" = 2
extrude "押し出し6" cut sketch "スケッチ13" along normal mid plane 100 contours L7 A1 L4 L11 L5 L2 | A1 | L7 A2 L4 A1 | L11 L4 L5 | L5 L4 L11 L10 L13 L12 | L7 L4 A2 | L4 A2 L11
fillet "フィレット7" radius 3 2 edges at (22.796, 2.25, -55.8524) (35.6432, 2.25, -78.1044)
sketch "スケッチ14" plane through (0, 3, 0) normal (0, 1, 0) x (1, 0, 0)
  line L0 (22.796, 67.0486) -> (22.796, 77.7003) projected
  line L1 (22.796, 77.7003) -> (15.796, 77.7003)
  line L2 (15.796, 77.7003) -> (15.796, 75.7003)
  line L3 (15.796, 75.7003) -> (22.796, 75.7003)
  line L4 (22.796, 75.7003) -> (22.796, 77.7003)
  line L5 (22.796, 75.7003) -> (20.796, 75.7003)
  line L6 (20.796, 75.7003) -> (20.796, 67.0486)
  line L7 (20.796, 67.0486) -> (22.796, 67.0486)
  line L8 (22.796, 67.0486) -> (22.796, 75.7003)
  point P0 (0, 0)
  dimension "d81" = 2
extrude "押し出し7" add sketch "スケッチ14" against normal blind 4
extrude "押し出し8" add sketch "スケッチ13" along normal blind 1 contours A3
equation "\"d3\" = d2"
equation "\"d7\" = d4"
equation "\"d19\" = d18"
equation "\"d21\" = Thickness"
equation "\"d28\" = Thickness"
equation "\"d30\" = Thickness"
equation "\"d33\" = d32"
equation "\"d34\" = d32"
equation "\"d35\" = d32"
equation "\"d36\" = d32"
equation "\"d37\" = d32"
equation "\"d38\" = d32"
equation "\"d39\" = d32"
equation "\"d40\" = d32"
equation "\"d41\" = Thickness"
equation "\"d45\" = d44"
equation "\"d46\" = d44"
equation "\"d47\" = d44"
equation "\"d48\" = d44"
equation "\"d49\" = d44"
equation "\"d50\" = d44"
equation "\"d51\" = d44"
equation "\"d16\" = Thickness"
equation "\"BendRadius\" = Thickness"
equation "\"BendReliefWidth\" = Thickness"
equation "\"BendReliefDepth\" = 0.5 * Thickness"
equation "\"CornerReliefSize\" = 4 * Thickness"
equation "\"MinimumRemnant\" = 2 * Thickness"
equation "\"TransitionRadius\" = BendRadius"
equation "\"JacobiRadiusSize\" = BendRadius"
equation "\"GapSize\" = Thickness"
equation "\"Thickness\" = 1.5"
properties part number "CORE_hat_outline_typeB_ver2"
